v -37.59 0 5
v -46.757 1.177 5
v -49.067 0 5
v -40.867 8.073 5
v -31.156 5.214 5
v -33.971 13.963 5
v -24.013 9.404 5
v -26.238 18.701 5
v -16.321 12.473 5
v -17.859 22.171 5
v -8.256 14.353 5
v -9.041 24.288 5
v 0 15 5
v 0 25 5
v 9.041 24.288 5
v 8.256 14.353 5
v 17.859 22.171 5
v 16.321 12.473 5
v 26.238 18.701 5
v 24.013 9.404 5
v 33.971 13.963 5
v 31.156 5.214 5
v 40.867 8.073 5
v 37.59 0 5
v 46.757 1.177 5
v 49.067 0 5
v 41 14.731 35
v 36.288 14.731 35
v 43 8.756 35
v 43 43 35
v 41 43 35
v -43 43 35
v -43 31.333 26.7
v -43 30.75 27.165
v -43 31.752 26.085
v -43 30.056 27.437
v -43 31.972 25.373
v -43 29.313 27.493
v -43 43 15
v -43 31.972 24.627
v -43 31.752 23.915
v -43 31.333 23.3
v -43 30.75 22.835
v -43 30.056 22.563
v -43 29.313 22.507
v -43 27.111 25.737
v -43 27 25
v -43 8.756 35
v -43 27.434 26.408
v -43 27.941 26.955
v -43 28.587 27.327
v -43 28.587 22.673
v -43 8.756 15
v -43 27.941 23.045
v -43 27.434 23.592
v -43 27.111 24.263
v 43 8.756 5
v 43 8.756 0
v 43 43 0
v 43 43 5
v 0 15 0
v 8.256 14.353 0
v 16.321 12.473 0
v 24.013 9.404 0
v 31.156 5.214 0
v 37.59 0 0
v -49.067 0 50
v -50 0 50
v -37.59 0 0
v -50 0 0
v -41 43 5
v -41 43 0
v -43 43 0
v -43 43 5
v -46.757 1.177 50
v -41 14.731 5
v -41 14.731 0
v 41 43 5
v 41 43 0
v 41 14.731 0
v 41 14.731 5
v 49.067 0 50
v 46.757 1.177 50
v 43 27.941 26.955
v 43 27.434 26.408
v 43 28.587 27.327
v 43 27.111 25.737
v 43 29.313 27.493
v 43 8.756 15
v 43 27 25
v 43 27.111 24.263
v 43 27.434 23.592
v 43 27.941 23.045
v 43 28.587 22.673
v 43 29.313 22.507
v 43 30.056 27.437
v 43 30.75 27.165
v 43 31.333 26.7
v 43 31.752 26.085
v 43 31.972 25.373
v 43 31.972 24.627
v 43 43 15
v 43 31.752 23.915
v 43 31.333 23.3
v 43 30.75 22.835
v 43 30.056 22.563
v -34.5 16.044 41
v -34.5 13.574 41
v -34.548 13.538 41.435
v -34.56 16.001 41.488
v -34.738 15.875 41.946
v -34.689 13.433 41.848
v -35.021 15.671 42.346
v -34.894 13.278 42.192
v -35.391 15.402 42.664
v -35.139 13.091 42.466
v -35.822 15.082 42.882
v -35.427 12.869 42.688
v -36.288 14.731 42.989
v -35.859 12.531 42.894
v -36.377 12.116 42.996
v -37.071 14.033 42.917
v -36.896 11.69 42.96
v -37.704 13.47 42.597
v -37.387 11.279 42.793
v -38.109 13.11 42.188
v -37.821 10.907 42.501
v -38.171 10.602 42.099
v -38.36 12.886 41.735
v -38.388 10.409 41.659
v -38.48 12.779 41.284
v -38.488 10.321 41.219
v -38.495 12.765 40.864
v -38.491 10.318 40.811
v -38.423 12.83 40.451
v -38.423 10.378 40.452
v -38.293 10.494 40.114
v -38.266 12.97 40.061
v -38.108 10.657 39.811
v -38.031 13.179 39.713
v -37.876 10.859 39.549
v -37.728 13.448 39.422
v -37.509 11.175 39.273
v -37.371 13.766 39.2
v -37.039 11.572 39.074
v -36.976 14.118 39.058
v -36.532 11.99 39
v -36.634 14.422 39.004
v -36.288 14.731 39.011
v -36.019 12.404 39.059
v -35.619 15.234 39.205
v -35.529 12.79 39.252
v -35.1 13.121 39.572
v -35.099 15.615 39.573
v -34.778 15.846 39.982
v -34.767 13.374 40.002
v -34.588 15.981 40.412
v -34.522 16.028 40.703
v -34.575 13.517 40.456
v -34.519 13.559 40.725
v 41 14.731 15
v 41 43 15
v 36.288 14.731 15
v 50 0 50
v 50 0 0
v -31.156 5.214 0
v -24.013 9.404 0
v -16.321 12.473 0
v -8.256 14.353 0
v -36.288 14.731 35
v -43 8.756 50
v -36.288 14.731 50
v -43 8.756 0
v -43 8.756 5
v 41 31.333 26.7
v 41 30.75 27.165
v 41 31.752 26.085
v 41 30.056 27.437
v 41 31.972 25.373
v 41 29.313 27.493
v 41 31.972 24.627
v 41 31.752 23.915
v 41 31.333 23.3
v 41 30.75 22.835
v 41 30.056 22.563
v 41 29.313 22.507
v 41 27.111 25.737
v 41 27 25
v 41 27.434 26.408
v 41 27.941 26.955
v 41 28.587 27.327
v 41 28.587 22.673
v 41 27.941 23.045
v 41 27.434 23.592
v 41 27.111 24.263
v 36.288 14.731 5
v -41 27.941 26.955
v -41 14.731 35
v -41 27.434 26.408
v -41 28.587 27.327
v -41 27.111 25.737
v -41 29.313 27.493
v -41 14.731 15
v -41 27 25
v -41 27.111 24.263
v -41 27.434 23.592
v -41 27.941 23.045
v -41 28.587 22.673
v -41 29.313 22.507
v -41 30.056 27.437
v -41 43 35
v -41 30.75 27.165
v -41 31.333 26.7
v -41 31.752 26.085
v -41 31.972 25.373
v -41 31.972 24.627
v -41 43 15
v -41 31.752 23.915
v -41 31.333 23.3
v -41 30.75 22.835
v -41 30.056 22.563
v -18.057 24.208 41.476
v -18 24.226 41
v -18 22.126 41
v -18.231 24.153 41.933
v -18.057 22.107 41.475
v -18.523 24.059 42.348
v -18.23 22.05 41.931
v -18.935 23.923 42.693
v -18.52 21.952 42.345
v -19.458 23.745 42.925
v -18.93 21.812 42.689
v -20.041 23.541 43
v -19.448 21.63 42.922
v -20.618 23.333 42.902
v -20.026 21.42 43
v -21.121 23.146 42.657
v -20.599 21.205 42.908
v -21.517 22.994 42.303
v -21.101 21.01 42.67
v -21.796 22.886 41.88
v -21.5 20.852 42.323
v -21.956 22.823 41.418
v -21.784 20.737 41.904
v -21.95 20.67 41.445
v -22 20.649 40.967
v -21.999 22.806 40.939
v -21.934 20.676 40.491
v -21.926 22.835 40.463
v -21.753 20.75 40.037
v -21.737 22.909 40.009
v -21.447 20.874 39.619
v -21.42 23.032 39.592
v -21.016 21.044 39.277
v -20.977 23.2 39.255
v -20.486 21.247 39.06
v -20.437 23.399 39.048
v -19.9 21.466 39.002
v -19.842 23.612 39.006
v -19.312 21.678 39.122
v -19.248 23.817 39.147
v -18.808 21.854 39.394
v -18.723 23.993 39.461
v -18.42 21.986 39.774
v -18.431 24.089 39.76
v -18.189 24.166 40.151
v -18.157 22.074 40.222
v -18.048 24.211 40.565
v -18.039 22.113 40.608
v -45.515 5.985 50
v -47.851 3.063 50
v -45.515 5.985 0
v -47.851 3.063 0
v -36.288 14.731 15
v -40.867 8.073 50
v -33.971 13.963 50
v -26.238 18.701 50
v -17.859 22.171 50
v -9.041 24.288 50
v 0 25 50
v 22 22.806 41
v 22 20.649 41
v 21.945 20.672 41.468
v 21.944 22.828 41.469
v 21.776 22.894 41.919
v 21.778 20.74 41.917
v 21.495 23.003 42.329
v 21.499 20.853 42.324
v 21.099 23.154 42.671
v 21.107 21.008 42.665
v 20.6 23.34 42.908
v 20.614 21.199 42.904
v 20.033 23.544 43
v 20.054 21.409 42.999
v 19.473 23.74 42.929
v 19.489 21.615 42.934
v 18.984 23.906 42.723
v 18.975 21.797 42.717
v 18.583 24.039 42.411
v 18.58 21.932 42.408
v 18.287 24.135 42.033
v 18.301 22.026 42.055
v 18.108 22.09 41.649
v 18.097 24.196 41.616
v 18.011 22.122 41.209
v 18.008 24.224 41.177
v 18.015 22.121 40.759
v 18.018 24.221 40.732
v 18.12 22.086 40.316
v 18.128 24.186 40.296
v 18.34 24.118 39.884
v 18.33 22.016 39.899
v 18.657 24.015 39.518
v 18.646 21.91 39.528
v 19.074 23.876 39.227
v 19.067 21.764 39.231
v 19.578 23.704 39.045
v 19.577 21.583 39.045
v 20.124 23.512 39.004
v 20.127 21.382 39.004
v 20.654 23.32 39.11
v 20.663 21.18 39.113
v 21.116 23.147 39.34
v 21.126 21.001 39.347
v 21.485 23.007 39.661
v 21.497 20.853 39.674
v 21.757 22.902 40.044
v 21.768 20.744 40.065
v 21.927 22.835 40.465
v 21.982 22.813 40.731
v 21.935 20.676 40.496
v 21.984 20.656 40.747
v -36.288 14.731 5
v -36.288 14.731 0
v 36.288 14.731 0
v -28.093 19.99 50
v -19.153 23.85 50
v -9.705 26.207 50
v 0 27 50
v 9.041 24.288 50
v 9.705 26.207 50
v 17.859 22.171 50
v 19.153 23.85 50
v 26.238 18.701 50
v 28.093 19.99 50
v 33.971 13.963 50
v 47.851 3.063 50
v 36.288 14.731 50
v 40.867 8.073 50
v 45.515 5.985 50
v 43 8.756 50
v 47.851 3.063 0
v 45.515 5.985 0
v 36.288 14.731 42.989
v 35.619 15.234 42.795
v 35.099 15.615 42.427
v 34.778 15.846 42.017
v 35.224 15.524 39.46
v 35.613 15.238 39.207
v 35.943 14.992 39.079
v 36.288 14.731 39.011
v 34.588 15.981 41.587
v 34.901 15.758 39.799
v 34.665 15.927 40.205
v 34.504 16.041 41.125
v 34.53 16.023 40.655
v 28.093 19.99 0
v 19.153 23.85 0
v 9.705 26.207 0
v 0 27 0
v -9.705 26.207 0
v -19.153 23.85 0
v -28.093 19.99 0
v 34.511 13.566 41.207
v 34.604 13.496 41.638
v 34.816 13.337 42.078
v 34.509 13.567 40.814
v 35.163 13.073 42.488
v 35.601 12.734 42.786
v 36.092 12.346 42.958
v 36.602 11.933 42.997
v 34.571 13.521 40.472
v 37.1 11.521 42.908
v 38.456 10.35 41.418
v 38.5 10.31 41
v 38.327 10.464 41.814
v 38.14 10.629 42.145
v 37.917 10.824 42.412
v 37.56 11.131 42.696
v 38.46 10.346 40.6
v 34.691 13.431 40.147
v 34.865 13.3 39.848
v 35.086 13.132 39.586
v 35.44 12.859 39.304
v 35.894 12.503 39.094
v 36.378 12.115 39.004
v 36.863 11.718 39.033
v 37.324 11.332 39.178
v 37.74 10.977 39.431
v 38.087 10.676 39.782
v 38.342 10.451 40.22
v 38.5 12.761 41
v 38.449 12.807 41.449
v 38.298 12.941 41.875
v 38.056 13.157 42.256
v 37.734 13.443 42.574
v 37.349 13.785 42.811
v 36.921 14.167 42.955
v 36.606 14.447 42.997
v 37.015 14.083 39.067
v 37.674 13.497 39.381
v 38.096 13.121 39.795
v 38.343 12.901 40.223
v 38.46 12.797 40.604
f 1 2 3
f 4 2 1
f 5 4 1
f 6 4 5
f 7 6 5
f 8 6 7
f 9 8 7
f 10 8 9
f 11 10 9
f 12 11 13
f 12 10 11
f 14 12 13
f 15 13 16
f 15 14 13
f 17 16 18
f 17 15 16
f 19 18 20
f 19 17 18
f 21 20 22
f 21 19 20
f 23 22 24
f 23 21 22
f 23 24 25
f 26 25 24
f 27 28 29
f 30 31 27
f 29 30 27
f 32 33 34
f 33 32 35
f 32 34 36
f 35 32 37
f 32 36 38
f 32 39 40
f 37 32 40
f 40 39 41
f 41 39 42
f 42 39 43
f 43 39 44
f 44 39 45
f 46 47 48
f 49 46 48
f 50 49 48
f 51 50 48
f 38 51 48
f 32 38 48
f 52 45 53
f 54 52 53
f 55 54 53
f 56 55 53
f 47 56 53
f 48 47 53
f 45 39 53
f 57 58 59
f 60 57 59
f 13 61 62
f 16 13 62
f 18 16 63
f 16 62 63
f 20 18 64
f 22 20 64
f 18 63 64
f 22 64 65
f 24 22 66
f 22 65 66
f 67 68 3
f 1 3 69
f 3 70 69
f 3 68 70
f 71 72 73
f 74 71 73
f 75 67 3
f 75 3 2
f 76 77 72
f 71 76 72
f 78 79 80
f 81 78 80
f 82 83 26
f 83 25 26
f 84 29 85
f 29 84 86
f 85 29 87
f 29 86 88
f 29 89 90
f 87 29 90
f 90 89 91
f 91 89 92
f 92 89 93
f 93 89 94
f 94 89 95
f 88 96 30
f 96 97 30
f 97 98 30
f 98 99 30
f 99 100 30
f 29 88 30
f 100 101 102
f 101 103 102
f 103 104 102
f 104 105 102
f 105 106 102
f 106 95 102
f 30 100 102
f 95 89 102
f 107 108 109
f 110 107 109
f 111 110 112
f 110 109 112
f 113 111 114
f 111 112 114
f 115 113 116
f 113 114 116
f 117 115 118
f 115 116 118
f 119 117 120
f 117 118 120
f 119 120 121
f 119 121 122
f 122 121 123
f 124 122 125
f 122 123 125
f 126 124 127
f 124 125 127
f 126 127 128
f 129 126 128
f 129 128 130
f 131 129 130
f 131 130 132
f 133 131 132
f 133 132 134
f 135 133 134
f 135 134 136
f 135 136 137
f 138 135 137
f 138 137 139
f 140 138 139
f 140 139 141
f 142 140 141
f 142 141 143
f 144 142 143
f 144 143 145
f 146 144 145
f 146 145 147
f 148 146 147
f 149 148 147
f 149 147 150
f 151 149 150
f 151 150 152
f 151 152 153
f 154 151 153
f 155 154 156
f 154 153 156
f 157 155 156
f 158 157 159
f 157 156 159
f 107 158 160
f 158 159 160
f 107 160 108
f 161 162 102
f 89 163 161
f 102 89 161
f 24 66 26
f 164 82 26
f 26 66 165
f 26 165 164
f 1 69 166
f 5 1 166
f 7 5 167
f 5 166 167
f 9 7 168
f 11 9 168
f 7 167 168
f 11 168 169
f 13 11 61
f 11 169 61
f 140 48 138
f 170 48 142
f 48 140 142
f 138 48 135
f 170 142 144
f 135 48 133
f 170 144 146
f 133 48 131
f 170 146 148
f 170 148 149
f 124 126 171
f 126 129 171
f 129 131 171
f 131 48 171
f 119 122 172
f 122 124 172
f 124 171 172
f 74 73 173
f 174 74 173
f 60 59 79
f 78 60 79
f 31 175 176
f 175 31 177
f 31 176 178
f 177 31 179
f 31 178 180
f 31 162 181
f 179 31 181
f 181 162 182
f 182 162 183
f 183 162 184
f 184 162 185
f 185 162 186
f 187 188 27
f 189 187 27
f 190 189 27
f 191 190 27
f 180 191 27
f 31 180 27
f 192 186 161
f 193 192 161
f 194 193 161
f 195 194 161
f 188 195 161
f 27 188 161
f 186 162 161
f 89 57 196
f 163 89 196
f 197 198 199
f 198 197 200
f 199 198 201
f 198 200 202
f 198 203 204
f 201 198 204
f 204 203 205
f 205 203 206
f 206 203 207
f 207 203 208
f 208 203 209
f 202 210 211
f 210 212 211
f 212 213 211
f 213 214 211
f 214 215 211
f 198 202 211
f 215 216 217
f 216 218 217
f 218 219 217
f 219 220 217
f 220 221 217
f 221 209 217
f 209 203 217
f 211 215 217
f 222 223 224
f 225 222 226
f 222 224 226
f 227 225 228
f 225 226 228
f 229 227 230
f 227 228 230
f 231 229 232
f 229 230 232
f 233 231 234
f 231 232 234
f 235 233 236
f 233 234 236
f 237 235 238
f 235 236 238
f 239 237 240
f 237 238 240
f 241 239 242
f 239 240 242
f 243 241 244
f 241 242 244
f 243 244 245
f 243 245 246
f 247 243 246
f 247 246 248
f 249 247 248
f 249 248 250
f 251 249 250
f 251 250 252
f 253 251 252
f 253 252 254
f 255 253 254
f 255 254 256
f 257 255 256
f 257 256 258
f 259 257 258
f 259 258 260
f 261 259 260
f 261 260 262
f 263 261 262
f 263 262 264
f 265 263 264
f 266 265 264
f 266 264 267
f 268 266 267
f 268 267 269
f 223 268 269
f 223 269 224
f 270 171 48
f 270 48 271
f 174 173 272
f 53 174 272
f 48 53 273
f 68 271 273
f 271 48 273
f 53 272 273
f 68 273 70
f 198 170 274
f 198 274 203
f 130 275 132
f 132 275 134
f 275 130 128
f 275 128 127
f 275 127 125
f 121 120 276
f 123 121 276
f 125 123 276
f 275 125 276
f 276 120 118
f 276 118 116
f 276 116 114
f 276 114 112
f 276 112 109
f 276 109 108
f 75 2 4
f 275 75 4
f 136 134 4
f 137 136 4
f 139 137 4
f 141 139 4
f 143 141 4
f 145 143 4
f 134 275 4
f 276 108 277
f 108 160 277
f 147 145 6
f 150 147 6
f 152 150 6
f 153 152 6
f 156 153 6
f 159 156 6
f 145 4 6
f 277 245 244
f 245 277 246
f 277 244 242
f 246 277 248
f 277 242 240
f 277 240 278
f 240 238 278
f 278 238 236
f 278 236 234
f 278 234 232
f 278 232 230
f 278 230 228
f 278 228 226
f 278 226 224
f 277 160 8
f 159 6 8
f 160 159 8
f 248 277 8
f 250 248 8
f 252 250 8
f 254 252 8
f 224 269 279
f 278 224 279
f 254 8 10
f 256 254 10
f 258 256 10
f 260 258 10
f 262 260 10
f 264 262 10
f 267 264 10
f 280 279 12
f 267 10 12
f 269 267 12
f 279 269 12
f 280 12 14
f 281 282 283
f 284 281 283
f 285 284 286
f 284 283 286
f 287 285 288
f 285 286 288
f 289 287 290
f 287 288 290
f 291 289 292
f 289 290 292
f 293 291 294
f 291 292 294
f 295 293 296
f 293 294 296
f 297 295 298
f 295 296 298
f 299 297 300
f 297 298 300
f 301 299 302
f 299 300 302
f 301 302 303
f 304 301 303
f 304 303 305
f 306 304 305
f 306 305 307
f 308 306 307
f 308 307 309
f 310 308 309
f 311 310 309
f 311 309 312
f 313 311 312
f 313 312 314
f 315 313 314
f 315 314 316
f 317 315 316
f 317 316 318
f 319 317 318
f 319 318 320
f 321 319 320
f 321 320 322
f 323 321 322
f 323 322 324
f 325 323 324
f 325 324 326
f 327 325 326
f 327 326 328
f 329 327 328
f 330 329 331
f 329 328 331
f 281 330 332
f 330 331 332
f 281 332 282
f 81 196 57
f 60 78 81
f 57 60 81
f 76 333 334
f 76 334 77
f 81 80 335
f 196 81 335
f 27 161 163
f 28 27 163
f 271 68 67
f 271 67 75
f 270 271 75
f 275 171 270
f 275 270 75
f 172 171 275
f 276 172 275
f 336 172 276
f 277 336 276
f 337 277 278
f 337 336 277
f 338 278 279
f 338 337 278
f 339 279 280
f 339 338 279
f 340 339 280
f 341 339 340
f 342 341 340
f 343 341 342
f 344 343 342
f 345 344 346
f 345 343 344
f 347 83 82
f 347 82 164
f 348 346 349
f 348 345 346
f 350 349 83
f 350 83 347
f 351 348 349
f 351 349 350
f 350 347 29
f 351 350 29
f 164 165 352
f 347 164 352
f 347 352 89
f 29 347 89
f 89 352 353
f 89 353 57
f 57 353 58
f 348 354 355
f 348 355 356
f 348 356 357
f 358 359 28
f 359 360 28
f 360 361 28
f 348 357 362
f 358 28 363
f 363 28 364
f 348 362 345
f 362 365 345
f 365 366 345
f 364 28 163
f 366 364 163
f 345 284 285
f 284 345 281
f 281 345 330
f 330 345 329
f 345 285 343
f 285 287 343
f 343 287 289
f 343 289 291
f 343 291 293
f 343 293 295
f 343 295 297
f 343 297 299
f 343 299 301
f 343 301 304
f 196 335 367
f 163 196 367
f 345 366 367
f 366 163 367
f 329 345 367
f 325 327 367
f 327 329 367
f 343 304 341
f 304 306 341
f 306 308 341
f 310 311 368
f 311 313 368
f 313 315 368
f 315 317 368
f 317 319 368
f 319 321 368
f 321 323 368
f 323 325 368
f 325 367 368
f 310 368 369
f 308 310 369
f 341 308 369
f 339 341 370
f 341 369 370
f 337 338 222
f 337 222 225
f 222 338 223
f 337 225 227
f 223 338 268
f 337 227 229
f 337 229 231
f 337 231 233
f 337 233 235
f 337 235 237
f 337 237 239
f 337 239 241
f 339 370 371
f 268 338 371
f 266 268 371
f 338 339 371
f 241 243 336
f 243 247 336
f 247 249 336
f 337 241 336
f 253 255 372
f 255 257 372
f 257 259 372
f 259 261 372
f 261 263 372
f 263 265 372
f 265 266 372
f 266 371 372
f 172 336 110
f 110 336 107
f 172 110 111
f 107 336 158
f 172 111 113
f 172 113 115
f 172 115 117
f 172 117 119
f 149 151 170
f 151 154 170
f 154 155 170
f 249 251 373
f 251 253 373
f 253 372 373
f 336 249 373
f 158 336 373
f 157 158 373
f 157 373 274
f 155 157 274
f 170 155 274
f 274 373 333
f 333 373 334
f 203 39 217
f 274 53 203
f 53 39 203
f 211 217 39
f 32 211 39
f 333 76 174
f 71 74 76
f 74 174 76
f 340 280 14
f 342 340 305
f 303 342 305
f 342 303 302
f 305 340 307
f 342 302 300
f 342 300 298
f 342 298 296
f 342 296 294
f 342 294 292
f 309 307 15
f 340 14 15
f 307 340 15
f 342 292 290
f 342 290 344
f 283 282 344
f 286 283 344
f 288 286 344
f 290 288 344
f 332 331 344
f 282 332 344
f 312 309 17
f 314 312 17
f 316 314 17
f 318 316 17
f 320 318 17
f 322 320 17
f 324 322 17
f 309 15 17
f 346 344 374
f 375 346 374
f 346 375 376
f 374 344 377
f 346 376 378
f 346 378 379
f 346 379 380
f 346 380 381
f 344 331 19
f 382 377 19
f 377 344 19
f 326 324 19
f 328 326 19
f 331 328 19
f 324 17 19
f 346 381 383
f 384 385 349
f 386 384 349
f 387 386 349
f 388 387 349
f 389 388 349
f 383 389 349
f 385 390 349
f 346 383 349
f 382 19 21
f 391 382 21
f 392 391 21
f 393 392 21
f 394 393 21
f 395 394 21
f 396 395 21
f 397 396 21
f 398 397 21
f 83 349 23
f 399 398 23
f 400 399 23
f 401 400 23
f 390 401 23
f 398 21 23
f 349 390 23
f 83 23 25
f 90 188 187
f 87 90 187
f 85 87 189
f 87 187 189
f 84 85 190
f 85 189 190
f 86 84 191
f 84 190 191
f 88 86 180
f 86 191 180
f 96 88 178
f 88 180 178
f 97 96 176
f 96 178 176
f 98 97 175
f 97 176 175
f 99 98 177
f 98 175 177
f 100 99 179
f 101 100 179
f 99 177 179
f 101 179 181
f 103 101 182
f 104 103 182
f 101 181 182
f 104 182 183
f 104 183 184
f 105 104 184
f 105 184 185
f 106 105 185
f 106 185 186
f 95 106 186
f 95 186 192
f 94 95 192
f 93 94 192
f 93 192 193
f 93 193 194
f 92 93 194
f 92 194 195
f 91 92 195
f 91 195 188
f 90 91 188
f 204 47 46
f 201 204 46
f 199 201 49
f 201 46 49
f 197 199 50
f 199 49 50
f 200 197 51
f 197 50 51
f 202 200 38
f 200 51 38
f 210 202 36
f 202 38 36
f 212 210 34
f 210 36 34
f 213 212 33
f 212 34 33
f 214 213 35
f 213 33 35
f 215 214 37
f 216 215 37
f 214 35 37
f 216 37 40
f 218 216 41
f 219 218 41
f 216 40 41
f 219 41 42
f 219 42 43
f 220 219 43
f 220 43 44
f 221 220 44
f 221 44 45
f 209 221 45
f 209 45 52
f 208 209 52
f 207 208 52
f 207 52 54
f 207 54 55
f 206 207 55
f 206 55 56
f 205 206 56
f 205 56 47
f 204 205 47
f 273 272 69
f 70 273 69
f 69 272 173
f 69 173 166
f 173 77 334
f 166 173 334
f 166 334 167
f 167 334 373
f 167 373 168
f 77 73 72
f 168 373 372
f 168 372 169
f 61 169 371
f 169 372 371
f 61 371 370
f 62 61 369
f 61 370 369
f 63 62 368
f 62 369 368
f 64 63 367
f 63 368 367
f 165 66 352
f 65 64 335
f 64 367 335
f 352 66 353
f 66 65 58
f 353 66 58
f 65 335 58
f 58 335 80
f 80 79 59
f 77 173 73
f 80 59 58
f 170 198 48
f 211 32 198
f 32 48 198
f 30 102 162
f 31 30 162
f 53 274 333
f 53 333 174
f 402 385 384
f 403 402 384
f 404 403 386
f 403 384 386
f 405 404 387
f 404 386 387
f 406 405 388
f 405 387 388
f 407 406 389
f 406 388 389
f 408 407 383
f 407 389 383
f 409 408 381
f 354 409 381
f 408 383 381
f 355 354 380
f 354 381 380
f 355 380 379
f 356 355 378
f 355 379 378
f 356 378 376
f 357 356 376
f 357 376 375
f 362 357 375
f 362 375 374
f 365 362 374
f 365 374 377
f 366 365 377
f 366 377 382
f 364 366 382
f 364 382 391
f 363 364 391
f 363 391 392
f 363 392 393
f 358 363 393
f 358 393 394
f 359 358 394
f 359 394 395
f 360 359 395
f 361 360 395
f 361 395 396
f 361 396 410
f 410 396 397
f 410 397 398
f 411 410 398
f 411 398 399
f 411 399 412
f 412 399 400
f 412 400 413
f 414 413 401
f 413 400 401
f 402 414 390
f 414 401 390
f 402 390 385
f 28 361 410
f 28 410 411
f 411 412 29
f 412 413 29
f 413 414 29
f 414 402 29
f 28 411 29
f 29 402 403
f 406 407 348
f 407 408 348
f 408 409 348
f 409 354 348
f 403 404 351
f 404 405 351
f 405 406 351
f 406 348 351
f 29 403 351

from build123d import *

# Parameters (mm, degrees)
F1_DEPTH    = 50
F3_DEPTH    = 15
F5_DEPTH    = 15
F6_R        = 2.5
F7_DEPTH    = 93.001
F8_T1_DEPTH = 57.6539038248
F9_DEPTH    = 5
F10_R       = 2
F11_DEPTH   = 33


# Not quite as in the source:
# - a fillet or chamfer that OpenCascade refuses, or shapes differently, is made with other operations: its cross-section is extruded or revolved along the edge and cut away or added


with BuildPart() as f1:
    # F0 (on Top) → F1 (new body)
    with BuildSketch(Plane.XY):
        with BuildLine():
            ThreePointArc((-43, 8.7560448021), (-46.7056429154, 4.5424231597), (-50, 0))
            Line((-50, 0), (-47.5900705485, 0))
            ThreePointArc((-47.5900705485, 0), (-26.8784989109, 18.3696900801), (0, 25))
            ThreePointArc((0, 25), (26.8784989109, 18.3696900801), (47.5900705485, 0))
            Line((47.5900705485, 0), (50, 0))
            ThreePointArc((50, 0), (46.7056429154, 4.5424231597), (43, 8.7560448021))
            Line((43, 8.7560448021), (43, 43))
            Line((43, 43), (41, 43))
            Line((41, 43), (41, 14.7306729384))
            Line((41, 14.7306729384), (36.2875219066, 14.7306729384))
            ThreePointArc((36.2875219066, 14.7306729384), (0, 27), (-36.2875219066, 14.7306729384))
            Line((-36.2875219066, 14.7306729384), (-41, 14.7306729384))
            Line((-41, 14.7306729384), (-41, 43))
            Line((-41, 43), (-43, 43))
            Line((-43, 43), (-43, 8.7560448021))
        make_face()
    extrude(amount=F1_DEPTH)

    # F2 (on face) → F3 (cut)
    with BuildSketch(Plane.XY.offset(50)):
        Polygon((-43, 8.7560448021), (-36.2875219066, 14.7306729384), (-41, 14.7306729384), (-41, 43), (-43, 43), align=None)
        Polygon((41, 43), (41, 14.7306729384), (36.2875219066, 14.7306729384), (43, 8.7560448021), (43, 43), align=None)
    extrude(amount=-F3_DEPTH, mode=Mode.SUBTRACT)

    # F4 (on face) → F5 (cut)
    with BuildSketch(Plane(origin=(0, 0, 0), x_dir=(1, 0, 0), z_dir=(0, 0, -1))):
        Polygon((-36.2875219066, -14.7306729384), (-43, -8.7560448021), (-43, -43), (-41, -43), (-41, -14.7306729384), align=None)
        Polygon((43, -8.7560448021), (36.2875219066, -14.7306729384), (41, -14.7306729384), (41, -43), (43, -43), align=None)
    extrude(amount=-F5_DEPTH, mode=Mode.SUBTRACT)

    # F6 (on face) → F7 (cut, through all)
    with BuildSketch(Plane(origin=(-43, 0, 0), x_dir=(0, -1, 0), z_dir=(-1, 0, 0))):
        with Locations((-29.5, 25)):
            Circle(F6_R)
    extrude(amount=-F7_DEPTH, mode=Mode.SUBTRACT)

    # F8: chamfer of 1.5 on 2 edges, made by hand

    # F8_s2 → F8_t1 (cut)
    with BuildSketch(Plane.XY.offset(-3.8269519124)):
        with BuildLine():
            Line((-49.1206089535, -0.027238599), (-46.7036689522, 1.2042065191))
            Line((-46.7036689522, 1.2042065191), (-46.6793989906, 1.186572207))
            ThreePointArc((-46.6793989906, 1.186572207), (-47.1374385844, 0.5954223102), (-47.565368237, -0.0170233899))
            Line((-47.565368237, -0.0170233899), (-47.5900705485, -0.03))
            ThreePointArc((-47.5900705485, -0.03), (-48.355339751, -0.03), (-49.1206089535, -0.057238599))
            Line((-49.1206089535, -0.057238599), (-49.1206089535, -0.027238599))
        make_face()
        with BuildLine():
            Line((46.7036689522, 1.2042065191), (49.1206089535, -0.027238599))
            Line((49.1206089535, -0.027238599), (49.1206089535, -0.057238599))
            ThreePointArc((49.1206089535, -0.057238599), (48.355339751, -0.03), (47.5900705485, -0.03))
            Line((47.5900705485, -0.03), (47.565368237, -0.0170233899))
            ThreePointArc((47.565368237, -0.0170233899), (47.1374385844, 0.5954223102), (46.6793989906, 1.186572207))
            Line((46.6793989906, 1.186572207), (46.7036689522, 1.2042065191))
        make_face()
    extrude(amount=F8_T1_DEPTH, mode=Mode.SUBTRACT)

    # F0 (on Top) → F9 (join)
    with BuildSketch(Plane.XY):
        with BuildLine():
            ThreePointArc((-43, 8.7560448021), (-46.7056429154, 4.5424231597), (-50, 0))
            Line((-50, 0), (-47.5900705485, 0))
            ThreePointArc((-47.5900705485, 0), (-26.8784989109, 18.3696900801), (0, 25))
            ThreePointArc((0, 25), (26.8784989109, 18.3696900801), (47.5900705485, 0))
            Line((47.5900705485, 0), (50, 0))
            ThreePointArc((50, 0), (46.7056429154, 4.5424231597), (43, 8.7560448021))
            Line((43, 8.7560448021), (43, 43))
            Line((43, 43), (41, 43))
            Line((41, 43), (41, 14.7306729384))
            Line((41, 14.7306729384), (36.2875219066, 14.7306729384))
            ThreePointArc((36.2875219066, 14.7306729384), (0, 27), (-36.2875219066, 14.7306729384))
            Line((-36.2875219066, 14.7306729384), (-41, 14.7306729384))
            Line((-41, 14.7306729384), (-41, 43))
            Line((-41, 43), (-43, 43))
            Line((-43, 43), (-43, 8.7560448021))
        make_face()
        with BuildLine():
            ThreePointArc((0, 25), (-26.8784989109, 18.3696900801), (-47.5900705485, 0))
            Line((-47.5900705485, 0), (-37.5900705485, 0))
            ThreePointArc((-37.5900705485, 0), (-20.2249265861, 11.0833143525), (0, 15))
            Line((0, 15), (0, 25))
        make_face()
        with BuildLine():
            ThreePointArc((47.5900705485, 0), (26.8784989109, 18.3696900801), (0, 25))
            Line((0, 25), (0, 15))
            ThreePointArc((0, 15), (20.2249265861, 11.0833143525), (37.5900705485, 0))
            Line((37.5900705485, 0), (47.5900705485, 0))
        make_face()
    extrude(amount=F9_DEPTH)

    # F10 (on Front) → F11 (cut)
    with BuildSketch(Plane.XZ):
        with Locations((-36.5, 41)):
            Circle(F10_R)
        with Locations((-20, 41)):
            Circle(F10_R)
        with Locations((20, 41)):
            Circle(F10_R)
        with Locations((36.5, 41)):
            Circle(F10_R)
    extrude(amount=-F11_DEPTH, mode=Mode.SUBTRACT)


solid = f1.part
